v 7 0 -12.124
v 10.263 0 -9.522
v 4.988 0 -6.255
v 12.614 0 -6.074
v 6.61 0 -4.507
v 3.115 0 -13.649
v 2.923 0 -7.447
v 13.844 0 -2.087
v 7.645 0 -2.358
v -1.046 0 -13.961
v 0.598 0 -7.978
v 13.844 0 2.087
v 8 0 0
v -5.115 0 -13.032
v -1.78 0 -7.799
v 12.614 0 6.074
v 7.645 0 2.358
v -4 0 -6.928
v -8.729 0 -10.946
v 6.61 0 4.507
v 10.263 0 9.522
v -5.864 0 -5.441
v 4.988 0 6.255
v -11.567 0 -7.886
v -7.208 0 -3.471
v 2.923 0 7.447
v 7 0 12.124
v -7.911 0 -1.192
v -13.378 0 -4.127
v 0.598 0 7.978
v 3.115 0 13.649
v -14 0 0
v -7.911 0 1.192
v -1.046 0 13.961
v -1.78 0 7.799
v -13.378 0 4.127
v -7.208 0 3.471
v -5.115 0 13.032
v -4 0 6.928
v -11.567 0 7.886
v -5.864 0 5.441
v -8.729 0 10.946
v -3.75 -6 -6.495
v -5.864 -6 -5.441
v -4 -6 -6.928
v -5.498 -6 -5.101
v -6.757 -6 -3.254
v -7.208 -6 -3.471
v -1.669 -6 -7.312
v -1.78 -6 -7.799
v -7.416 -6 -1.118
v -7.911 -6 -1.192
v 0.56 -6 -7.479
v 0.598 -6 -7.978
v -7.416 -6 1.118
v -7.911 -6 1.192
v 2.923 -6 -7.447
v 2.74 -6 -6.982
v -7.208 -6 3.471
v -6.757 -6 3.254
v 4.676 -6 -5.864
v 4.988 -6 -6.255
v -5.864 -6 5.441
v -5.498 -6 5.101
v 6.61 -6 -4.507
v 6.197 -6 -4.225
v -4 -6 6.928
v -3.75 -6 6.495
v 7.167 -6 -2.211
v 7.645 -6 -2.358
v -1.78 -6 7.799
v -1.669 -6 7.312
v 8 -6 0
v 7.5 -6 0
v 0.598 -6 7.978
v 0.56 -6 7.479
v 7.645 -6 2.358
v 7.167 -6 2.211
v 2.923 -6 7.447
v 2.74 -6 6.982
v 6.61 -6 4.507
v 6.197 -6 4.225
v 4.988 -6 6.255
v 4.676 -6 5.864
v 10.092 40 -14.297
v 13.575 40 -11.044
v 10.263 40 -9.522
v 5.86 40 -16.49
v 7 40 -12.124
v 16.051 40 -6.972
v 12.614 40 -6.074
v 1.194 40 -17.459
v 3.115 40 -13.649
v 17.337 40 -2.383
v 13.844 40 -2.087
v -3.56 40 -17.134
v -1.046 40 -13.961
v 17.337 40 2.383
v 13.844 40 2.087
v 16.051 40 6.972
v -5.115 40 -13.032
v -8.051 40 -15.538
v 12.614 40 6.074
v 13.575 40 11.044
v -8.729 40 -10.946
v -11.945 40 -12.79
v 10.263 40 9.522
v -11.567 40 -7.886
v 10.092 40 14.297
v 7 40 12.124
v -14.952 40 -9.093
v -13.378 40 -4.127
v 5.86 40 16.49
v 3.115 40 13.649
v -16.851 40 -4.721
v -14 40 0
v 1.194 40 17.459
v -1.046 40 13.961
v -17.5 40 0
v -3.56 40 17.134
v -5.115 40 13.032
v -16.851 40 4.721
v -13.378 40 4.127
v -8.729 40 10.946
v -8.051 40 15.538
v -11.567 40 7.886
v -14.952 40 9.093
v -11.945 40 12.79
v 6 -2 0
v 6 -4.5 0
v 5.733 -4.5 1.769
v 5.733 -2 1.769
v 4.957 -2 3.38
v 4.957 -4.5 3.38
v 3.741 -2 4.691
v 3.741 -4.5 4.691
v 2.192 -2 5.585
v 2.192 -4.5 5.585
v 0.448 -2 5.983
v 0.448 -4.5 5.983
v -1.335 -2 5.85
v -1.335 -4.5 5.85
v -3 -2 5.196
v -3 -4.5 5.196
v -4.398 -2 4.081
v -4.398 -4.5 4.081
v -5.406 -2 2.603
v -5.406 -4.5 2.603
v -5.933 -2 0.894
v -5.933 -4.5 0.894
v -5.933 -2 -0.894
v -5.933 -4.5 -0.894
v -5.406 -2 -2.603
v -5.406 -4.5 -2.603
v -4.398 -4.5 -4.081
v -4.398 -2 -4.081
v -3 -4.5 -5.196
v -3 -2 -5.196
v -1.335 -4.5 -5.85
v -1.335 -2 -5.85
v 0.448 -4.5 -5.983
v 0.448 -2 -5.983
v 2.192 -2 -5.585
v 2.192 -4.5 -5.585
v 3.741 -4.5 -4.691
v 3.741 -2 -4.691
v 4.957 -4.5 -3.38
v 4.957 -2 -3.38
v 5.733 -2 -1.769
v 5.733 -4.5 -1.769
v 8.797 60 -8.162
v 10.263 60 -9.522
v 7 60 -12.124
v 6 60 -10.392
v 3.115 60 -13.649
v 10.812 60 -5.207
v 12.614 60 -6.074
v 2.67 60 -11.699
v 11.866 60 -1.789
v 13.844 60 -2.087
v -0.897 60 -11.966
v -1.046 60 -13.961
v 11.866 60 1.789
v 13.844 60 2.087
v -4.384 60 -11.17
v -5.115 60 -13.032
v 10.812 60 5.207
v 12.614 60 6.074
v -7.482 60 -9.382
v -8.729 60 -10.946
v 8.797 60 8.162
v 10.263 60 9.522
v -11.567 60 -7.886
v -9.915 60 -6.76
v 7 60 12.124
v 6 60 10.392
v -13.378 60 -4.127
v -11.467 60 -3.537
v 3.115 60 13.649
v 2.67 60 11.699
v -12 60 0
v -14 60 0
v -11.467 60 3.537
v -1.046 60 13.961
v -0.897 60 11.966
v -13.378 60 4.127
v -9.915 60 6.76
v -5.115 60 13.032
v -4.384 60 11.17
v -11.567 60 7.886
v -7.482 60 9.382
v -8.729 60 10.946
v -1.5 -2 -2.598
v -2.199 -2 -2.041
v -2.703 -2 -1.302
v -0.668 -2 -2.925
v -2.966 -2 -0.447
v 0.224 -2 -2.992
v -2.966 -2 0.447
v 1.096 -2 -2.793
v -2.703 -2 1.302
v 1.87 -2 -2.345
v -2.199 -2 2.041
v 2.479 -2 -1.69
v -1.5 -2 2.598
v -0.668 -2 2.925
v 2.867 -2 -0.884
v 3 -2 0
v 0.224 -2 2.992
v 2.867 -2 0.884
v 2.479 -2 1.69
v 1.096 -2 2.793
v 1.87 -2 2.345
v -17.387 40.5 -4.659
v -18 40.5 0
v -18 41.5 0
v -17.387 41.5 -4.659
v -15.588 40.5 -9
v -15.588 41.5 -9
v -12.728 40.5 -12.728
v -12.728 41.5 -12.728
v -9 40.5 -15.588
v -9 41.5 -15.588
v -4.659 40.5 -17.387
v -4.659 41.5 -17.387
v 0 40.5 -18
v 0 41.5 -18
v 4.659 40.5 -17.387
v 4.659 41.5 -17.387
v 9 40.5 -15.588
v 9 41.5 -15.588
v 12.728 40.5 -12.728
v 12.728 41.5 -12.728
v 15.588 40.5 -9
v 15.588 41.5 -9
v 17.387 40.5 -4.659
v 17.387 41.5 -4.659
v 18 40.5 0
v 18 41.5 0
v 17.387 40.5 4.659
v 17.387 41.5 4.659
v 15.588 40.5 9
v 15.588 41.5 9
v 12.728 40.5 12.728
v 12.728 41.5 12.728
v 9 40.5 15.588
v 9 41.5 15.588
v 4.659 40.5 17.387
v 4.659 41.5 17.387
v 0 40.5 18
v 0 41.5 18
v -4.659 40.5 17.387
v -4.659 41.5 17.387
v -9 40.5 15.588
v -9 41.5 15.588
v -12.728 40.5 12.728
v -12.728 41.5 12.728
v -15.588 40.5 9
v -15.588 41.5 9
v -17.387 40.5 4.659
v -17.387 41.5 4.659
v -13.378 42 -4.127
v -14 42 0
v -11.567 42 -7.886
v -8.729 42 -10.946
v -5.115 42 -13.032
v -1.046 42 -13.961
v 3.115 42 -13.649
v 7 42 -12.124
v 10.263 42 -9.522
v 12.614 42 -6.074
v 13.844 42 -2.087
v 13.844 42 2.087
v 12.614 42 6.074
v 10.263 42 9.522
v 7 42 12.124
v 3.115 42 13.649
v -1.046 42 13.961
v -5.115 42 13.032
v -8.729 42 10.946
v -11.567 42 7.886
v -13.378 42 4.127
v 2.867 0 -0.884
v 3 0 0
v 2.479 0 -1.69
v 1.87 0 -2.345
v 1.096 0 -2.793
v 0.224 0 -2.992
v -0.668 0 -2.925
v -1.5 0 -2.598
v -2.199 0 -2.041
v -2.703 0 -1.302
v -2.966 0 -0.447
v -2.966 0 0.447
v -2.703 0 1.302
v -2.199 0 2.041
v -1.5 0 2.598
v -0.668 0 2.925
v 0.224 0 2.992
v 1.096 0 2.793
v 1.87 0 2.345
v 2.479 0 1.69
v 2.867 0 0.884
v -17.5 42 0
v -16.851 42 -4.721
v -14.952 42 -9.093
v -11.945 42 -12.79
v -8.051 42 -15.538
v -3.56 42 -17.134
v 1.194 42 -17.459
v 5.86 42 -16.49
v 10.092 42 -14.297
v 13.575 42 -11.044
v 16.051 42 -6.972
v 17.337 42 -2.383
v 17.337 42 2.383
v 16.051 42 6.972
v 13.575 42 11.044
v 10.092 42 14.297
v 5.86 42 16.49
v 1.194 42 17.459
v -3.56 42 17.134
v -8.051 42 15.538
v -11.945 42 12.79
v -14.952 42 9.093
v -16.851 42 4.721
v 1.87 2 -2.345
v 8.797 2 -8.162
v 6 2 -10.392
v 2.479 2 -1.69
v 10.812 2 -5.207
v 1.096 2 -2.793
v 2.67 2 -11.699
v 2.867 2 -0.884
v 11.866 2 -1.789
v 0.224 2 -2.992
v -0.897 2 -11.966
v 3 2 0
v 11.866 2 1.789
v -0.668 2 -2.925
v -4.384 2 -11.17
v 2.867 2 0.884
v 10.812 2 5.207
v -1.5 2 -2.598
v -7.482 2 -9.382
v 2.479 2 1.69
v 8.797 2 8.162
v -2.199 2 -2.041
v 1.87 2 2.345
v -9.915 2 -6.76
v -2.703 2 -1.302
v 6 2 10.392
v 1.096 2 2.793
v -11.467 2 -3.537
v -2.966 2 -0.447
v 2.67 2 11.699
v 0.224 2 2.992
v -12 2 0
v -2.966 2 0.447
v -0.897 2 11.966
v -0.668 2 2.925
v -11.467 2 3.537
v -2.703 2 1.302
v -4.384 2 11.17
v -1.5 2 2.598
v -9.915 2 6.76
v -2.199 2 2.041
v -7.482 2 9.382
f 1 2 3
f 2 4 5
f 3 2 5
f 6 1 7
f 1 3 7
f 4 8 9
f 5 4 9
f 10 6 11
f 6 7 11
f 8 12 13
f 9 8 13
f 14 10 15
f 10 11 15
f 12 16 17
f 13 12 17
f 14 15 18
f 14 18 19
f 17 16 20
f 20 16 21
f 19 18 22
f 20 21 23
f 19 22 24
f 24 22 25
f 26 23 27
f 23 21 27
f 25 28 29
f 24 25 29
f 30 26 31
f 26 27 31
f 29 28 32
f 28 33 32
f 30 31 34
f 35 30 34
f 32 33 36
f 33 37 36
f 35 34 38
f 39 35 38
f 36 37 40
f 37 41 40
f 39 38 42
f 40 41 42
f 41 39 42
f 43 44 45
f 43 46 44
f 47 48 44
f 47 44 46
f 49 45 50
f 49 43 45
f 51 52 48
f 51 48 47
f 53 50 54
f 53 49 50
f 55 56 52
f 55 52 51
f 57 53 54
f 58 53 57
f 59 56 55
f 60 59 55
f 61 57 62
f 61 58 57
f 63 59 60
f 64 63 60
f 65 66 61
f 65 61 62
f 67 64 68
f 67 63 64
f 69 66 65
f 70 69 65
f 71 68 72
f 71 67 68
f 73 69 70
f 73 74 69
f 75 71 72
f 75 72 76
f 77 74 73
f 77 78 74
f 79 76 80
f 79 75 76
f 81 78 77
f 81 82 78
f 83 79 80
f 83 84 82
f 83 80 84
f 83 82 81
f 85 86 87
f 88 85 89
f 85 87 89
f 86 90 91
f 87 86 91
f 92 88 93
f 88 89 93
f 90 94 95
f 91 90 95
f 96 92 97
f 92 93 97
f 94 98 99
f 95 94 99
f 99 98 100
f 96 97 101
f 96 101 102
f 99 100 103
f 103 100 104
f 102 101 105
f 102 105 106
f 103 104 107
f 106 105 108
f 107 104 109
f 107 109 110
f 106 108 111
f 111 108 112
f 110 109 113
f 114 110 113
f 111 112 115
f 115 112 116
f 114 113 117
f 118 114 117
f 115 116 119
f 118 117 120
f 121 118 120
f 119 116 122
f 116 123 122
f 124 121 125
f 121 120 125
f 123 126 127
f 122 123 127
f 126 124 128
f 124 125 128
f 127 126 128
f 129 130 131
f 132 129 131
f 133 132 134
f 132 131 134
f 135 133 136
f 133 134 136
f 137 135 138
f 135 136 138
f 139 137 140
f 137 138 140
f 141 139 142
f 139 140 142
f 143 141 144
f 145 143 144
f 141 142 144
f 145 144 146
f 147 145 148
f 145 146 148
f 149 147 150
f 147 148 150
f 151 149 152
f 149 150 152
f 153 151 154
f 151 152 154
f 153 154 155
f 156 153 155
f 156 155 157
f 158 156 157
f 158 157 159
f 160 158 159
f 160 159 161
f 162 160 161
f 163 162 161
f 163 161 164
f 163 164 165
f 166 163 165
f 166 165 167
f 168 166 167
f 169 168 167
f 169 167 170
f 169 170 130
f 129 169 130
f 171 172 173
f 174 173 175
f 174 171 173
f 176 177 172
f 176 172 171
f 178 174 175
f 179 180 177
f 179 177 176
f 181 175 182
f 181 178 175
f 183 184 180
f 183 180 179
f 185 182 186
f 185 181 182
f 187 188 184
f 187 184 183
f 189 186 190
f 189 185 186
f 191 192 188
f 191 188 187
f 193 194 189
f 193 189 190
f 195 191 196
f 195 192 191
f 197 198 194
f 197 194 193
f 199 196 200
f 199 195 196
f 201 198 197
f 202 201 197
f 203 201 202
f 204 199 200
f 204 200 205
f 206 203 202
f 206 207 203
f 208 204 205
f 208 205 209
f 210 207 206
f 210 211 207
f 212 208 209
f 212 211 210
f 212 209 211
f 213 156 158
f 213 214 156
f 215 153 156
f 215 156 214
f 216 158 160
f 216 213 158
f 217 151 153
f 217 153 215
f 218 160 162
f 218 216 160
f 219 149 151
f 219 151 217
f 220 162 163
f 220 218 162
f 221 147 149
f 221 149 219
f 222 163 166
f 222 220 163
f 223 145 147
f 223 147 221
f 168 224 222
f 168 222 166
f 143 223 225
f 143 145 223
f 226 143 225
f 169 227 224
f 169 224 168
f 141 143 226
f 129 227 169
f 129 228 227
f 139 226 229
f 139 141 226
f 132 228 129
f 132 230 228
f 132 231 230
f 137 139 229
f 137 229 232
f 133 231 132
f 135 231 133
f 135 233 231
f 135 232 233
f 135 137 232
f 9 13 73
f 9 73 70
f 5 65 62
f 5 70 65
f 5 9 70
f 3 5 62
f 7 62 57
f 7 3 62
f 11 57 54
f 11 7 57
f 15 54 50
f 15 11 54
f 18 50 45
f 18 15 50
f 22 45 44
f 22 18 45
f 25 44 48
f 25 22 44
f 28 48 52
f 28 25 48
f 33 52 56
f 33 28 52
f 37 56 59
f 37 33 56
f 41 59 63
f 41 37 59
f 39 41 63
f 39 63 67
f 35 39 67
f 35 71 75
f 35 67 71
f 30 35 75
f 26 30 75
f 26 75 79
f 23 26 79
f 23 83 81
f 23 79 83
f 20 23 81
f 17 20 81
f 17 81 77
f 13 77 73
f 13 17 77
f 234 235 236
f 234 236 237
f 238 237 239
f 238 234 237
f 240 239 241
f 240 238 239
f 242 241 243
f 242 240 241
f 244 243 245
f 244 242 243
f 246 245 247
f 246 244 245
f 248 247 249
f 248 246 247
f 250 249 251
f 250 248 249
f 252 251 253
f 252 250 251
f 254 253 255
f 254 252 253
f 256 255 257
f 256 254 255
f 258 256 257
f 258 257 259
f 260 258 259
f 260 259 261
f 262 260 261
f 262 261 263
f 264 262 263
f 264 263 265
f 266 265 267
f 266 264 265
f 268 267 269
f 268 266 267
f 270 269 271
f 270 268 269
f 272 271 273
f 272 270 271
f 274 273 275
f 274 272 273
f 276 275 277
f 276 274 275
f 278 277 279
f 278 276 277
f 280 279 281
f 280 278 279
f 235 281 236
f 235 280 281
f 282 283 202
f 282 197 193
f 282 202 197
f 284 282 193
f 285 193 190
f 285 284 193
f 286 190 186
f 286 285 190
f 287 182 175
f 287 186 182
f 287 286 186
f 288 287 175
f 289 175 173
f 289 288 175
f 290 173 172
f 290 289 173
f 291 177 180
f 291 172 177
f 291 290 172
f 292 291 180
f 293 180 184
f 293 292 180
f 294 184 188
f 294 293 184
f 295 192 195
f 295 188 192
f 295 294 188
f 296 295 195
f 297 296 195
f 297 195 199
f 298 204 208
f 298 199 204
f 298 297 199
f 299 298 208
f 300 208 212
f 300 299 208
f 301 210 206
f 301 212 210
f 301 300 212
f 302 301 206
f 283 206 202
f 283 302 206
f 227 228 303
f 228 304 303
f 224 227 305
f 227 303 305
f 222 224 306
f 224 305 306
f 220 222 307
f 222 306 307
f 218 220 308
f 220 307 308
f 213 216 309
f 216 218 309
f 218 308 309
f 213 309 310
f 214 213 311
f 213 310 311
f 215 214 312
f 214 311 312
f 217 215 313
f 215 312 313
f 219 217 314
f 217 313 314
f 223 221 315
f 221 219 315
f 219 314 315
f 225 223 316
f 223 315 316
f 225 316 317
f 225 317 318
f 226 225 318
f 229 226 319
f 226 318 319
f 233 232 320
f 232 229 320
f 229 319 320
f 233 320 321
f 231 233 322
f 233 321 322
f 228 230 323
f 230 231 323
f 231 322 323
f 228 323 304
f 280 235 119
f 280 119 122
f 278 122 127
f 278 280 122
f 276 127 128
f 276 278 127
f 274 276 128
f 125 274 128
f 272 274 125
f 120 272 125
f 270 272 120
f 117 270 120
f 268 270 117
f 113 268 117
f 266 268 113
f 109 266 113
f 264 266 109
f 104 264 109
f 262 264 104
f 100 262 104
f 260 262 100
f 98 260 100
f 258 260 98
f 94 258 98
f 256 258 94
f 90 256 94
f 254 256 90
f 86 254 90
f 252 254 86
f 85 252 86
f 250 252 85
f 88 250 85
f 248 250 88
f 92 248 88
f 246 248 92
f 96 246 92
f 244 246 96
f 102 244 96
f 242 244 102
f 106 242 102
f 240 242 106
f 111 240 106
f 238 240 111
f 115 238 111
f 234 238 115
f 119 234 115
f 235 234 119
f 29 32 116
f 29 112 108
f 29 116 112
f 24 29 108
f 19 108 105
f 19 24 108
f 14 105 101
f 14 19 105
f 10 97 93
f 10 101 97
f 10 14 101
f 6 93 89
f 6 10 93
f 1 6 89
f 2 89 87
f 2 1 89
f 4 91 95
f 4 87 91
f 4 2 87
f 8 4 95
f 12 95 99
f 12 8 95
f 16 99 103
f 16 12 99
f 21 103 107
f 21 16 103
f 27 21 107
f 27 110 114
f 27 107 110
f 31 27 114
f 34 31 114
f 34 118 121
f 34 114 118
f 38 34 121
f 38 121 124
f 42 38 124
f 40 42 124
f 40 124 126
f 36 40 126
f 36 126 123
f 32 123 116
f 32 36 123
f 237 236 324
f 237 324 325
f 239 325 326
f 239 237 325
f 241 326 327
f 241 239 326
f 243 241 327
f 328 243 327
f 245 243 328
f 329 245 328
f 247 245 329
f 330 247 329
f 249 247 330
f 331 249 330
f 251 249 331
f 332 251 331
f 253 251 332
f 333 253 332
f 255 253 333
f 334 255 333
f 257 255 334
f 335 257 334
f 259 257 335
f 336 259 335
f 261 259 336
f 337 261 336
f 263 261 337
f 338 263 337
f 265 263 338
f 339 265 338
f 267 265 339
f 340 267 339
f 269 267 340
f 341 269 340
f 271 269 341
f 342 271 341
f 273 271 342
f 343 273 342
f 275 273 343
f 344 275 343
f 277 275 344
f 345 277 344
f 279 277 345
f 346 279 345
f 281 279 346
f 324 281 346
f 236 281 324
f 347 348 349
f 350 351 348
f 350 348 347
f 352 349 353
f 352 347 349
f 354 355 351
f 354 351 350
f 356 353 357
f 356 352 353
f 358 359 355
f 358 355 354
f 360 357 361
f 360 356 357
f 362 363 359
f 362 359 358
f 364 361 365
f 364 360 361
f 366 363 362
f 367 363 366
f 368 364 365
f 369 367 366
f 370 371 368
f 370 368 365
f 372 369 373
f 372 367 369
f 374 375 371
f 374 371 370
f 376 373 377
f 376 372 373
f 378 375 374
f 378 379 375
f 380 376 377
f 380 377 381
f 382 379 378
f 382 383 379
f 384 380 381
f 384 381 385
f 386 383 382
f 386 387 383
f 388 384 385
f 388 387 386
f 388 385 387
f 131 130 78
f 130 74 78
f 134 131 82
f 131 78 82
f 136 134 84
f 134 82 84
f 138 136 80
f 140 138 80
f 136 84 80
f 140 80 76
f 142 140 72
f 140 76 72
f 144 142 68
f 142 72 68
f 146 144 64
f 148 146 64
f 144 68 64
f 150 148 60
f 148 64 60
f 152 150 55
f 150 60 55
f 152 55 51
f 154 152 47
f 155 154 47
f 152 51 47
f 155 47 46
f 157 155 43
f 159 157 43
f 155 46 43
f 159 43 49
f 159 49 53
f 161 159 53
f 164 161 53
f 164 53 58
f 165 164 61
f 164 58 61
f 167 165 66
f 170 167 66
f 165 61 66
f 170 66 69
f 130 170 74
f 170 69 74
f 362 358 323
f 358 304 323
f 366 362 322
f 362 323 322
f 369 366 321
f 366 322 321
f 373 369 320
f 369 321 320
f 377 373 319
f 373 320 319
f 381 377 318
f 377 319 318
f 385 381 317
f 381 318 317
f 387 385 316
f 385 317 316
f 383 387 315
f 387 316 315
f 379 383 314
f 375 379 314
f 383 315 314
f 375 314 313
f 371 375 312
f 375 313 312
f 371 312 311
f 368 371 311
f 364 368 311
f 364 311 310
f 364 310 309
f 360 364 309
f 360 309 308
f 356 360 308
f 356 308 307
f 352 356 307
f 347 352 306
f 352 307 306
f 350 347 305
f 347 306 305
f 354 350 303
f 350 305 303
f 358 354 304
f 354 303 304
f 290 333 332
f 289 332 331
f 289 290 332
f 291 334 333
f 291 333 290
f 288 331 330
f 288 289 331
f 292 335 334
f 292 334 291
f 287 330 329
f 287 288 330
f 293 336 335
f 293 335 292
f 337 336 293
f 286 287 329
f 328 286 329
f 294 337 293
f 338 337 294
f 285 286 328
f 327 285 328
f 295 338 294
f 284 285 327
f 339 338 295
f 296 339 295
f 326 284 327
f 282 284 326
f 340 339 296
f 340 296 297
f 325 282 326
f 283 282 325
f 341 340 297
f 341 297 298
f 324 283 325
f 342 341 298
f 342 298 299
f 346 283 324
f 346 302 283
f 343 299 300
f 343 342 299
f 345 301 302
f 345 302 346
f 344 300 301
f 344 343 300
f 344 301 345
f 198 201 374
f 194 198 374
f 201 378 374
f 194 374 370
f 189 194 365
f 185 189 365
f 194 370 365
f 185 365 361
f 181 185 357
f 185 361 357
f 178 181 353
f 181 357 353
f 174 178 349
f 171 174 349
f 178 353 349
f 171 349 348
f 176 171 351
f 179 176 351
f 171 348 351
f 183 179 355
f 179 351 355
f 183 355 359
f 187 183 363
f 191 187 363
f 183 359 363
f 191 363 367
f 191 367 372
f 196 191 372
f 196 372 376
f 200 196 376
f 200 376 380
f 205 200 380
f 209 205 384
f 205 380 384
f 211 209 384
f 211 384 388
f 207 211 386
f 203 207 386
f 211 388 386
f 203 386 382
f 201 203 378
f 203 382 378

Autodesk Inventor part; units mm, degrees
ref_plane "YZ Plane" through (0, 0, 0) normal (1, 0, 0) x (0, 1, 0)
ref_plane "XZ Plane" through (0, 0, 0) normal (0, 1, 0) x (-1, 0, 0)
ref_plane "XY Plane" through (0, 0, 0) normal (0, 0, 1) x (1, 0, 0)
sketch "Boceto1" plane through (0, 0, 0) normal (0, 1, 0) x (-1, 0, 0)
  circle A0 centre (0, 0) radius 14
  dimension "d0" = 28
extrude "Extrusión1" add sketch "Boceto1" along normal blind 60
shell "Vaciado1" thickness 2 removed faces 1 at (-2.651, 60, 3.8406)
sketch "Boceto2" plane through (0, 0, 0) normal (1, 0, 0) x (0, 1, 0)
  line L0 (0, -14) -> (60, -14) projected
  line L1 (0, 14) -> (60, 14) projected
  line L2 (46, -14) -> (48, -14)
  line L3 (48, -14) -> (48, -19)
  line L4 (48, -19) -> (46, -19)
  line L5 (46, -19) -> (46, -14)
  point P0 (0, 0)
  dimension "d4" = 14
  dimension "d5" = 2
  dimension "d6" = 5
sketch "Boceto3" plane through (0, 0, 0) normal (1, 0, 0) x (0, 1, 0)
  line L0 (84.0119, 0) -> (36.1853, 0)
  point P0 (0, 0)
sketch "Boceto4" plane through (0, 0, 0) normal (0, -1, 0) x (1, 0, 0)
  circle A0 centre (0, 0) radius 3
  circle A1 centre (0, 0) radius 6
  dimension "d7" = 6
  dimension "d8" = 12
extrude "Extrusión2" cut sketch "Boceto4" against normal through all contours A0
sketch "Boceto5" plane through (0, 0, 0) normal (0, -1, 0) x (1, 0, 0)
  circle A0 centre (0, 0) radius 3 projected
sketch "Boceto6" plane through (0, 0, 0) normal (0, 0, 1) x (1, 0, 0)
  line L0 (-14, 0) -> (-14, 60) projected
  line L1 (-14, 42) -> (-18, 42)
  line L2 (-18, 42) -> (-18, 40)
  line L3 (-18, 40) -> (-14, 40)
  line L4 (14, 60) -> (-14, 60) projected
  line L5 (0, -14.2107) -> (0, 116.483)
  point P0 (0, 0)
  dimension "d11" = 18
  dimension "d12" = 2
  dimension "d13" = 4
sketch "Boceto7" plane through (0, 0, 0) normal (0, -1, 0) x (1, 0, 0)
  circle A0 centre (0, 0) radius 3 projected
  circle A1 centre (0, 0) radius 8
  dimension "d14" = 16
extrude "Extrusión3" add sketch "Boceto7" along normal blind 6
sketch "Boceto8" plane through (0, -6, 0) normal (0, -1, 0) x (1, 0, 0)
  circle A0 centre (0, 0) radius 8 projected
  circle A1 centre (0, 0) radius 6
  circle A2 centre (0, 0) radius 3 projected
  dimension "d17" = 2
extrude "Extrusión4" cut sketch "Boceto8" against normal blind 4 contours A1
chamfer "Chaflán1" distance 1.5 angle 45 1 edges at (-6, -6, 0)
revolve "Revolución1" add sketch "Boceto6" angle 360 about axis through (0, -14.2107, 0) along (0, 1, 0)
chamfer "Chaflán2" distance 0.5 angle 45 2 edges at (18, 40, 0) (18, 42, 0)
properties part number "shocks_spring" material "Plata"
